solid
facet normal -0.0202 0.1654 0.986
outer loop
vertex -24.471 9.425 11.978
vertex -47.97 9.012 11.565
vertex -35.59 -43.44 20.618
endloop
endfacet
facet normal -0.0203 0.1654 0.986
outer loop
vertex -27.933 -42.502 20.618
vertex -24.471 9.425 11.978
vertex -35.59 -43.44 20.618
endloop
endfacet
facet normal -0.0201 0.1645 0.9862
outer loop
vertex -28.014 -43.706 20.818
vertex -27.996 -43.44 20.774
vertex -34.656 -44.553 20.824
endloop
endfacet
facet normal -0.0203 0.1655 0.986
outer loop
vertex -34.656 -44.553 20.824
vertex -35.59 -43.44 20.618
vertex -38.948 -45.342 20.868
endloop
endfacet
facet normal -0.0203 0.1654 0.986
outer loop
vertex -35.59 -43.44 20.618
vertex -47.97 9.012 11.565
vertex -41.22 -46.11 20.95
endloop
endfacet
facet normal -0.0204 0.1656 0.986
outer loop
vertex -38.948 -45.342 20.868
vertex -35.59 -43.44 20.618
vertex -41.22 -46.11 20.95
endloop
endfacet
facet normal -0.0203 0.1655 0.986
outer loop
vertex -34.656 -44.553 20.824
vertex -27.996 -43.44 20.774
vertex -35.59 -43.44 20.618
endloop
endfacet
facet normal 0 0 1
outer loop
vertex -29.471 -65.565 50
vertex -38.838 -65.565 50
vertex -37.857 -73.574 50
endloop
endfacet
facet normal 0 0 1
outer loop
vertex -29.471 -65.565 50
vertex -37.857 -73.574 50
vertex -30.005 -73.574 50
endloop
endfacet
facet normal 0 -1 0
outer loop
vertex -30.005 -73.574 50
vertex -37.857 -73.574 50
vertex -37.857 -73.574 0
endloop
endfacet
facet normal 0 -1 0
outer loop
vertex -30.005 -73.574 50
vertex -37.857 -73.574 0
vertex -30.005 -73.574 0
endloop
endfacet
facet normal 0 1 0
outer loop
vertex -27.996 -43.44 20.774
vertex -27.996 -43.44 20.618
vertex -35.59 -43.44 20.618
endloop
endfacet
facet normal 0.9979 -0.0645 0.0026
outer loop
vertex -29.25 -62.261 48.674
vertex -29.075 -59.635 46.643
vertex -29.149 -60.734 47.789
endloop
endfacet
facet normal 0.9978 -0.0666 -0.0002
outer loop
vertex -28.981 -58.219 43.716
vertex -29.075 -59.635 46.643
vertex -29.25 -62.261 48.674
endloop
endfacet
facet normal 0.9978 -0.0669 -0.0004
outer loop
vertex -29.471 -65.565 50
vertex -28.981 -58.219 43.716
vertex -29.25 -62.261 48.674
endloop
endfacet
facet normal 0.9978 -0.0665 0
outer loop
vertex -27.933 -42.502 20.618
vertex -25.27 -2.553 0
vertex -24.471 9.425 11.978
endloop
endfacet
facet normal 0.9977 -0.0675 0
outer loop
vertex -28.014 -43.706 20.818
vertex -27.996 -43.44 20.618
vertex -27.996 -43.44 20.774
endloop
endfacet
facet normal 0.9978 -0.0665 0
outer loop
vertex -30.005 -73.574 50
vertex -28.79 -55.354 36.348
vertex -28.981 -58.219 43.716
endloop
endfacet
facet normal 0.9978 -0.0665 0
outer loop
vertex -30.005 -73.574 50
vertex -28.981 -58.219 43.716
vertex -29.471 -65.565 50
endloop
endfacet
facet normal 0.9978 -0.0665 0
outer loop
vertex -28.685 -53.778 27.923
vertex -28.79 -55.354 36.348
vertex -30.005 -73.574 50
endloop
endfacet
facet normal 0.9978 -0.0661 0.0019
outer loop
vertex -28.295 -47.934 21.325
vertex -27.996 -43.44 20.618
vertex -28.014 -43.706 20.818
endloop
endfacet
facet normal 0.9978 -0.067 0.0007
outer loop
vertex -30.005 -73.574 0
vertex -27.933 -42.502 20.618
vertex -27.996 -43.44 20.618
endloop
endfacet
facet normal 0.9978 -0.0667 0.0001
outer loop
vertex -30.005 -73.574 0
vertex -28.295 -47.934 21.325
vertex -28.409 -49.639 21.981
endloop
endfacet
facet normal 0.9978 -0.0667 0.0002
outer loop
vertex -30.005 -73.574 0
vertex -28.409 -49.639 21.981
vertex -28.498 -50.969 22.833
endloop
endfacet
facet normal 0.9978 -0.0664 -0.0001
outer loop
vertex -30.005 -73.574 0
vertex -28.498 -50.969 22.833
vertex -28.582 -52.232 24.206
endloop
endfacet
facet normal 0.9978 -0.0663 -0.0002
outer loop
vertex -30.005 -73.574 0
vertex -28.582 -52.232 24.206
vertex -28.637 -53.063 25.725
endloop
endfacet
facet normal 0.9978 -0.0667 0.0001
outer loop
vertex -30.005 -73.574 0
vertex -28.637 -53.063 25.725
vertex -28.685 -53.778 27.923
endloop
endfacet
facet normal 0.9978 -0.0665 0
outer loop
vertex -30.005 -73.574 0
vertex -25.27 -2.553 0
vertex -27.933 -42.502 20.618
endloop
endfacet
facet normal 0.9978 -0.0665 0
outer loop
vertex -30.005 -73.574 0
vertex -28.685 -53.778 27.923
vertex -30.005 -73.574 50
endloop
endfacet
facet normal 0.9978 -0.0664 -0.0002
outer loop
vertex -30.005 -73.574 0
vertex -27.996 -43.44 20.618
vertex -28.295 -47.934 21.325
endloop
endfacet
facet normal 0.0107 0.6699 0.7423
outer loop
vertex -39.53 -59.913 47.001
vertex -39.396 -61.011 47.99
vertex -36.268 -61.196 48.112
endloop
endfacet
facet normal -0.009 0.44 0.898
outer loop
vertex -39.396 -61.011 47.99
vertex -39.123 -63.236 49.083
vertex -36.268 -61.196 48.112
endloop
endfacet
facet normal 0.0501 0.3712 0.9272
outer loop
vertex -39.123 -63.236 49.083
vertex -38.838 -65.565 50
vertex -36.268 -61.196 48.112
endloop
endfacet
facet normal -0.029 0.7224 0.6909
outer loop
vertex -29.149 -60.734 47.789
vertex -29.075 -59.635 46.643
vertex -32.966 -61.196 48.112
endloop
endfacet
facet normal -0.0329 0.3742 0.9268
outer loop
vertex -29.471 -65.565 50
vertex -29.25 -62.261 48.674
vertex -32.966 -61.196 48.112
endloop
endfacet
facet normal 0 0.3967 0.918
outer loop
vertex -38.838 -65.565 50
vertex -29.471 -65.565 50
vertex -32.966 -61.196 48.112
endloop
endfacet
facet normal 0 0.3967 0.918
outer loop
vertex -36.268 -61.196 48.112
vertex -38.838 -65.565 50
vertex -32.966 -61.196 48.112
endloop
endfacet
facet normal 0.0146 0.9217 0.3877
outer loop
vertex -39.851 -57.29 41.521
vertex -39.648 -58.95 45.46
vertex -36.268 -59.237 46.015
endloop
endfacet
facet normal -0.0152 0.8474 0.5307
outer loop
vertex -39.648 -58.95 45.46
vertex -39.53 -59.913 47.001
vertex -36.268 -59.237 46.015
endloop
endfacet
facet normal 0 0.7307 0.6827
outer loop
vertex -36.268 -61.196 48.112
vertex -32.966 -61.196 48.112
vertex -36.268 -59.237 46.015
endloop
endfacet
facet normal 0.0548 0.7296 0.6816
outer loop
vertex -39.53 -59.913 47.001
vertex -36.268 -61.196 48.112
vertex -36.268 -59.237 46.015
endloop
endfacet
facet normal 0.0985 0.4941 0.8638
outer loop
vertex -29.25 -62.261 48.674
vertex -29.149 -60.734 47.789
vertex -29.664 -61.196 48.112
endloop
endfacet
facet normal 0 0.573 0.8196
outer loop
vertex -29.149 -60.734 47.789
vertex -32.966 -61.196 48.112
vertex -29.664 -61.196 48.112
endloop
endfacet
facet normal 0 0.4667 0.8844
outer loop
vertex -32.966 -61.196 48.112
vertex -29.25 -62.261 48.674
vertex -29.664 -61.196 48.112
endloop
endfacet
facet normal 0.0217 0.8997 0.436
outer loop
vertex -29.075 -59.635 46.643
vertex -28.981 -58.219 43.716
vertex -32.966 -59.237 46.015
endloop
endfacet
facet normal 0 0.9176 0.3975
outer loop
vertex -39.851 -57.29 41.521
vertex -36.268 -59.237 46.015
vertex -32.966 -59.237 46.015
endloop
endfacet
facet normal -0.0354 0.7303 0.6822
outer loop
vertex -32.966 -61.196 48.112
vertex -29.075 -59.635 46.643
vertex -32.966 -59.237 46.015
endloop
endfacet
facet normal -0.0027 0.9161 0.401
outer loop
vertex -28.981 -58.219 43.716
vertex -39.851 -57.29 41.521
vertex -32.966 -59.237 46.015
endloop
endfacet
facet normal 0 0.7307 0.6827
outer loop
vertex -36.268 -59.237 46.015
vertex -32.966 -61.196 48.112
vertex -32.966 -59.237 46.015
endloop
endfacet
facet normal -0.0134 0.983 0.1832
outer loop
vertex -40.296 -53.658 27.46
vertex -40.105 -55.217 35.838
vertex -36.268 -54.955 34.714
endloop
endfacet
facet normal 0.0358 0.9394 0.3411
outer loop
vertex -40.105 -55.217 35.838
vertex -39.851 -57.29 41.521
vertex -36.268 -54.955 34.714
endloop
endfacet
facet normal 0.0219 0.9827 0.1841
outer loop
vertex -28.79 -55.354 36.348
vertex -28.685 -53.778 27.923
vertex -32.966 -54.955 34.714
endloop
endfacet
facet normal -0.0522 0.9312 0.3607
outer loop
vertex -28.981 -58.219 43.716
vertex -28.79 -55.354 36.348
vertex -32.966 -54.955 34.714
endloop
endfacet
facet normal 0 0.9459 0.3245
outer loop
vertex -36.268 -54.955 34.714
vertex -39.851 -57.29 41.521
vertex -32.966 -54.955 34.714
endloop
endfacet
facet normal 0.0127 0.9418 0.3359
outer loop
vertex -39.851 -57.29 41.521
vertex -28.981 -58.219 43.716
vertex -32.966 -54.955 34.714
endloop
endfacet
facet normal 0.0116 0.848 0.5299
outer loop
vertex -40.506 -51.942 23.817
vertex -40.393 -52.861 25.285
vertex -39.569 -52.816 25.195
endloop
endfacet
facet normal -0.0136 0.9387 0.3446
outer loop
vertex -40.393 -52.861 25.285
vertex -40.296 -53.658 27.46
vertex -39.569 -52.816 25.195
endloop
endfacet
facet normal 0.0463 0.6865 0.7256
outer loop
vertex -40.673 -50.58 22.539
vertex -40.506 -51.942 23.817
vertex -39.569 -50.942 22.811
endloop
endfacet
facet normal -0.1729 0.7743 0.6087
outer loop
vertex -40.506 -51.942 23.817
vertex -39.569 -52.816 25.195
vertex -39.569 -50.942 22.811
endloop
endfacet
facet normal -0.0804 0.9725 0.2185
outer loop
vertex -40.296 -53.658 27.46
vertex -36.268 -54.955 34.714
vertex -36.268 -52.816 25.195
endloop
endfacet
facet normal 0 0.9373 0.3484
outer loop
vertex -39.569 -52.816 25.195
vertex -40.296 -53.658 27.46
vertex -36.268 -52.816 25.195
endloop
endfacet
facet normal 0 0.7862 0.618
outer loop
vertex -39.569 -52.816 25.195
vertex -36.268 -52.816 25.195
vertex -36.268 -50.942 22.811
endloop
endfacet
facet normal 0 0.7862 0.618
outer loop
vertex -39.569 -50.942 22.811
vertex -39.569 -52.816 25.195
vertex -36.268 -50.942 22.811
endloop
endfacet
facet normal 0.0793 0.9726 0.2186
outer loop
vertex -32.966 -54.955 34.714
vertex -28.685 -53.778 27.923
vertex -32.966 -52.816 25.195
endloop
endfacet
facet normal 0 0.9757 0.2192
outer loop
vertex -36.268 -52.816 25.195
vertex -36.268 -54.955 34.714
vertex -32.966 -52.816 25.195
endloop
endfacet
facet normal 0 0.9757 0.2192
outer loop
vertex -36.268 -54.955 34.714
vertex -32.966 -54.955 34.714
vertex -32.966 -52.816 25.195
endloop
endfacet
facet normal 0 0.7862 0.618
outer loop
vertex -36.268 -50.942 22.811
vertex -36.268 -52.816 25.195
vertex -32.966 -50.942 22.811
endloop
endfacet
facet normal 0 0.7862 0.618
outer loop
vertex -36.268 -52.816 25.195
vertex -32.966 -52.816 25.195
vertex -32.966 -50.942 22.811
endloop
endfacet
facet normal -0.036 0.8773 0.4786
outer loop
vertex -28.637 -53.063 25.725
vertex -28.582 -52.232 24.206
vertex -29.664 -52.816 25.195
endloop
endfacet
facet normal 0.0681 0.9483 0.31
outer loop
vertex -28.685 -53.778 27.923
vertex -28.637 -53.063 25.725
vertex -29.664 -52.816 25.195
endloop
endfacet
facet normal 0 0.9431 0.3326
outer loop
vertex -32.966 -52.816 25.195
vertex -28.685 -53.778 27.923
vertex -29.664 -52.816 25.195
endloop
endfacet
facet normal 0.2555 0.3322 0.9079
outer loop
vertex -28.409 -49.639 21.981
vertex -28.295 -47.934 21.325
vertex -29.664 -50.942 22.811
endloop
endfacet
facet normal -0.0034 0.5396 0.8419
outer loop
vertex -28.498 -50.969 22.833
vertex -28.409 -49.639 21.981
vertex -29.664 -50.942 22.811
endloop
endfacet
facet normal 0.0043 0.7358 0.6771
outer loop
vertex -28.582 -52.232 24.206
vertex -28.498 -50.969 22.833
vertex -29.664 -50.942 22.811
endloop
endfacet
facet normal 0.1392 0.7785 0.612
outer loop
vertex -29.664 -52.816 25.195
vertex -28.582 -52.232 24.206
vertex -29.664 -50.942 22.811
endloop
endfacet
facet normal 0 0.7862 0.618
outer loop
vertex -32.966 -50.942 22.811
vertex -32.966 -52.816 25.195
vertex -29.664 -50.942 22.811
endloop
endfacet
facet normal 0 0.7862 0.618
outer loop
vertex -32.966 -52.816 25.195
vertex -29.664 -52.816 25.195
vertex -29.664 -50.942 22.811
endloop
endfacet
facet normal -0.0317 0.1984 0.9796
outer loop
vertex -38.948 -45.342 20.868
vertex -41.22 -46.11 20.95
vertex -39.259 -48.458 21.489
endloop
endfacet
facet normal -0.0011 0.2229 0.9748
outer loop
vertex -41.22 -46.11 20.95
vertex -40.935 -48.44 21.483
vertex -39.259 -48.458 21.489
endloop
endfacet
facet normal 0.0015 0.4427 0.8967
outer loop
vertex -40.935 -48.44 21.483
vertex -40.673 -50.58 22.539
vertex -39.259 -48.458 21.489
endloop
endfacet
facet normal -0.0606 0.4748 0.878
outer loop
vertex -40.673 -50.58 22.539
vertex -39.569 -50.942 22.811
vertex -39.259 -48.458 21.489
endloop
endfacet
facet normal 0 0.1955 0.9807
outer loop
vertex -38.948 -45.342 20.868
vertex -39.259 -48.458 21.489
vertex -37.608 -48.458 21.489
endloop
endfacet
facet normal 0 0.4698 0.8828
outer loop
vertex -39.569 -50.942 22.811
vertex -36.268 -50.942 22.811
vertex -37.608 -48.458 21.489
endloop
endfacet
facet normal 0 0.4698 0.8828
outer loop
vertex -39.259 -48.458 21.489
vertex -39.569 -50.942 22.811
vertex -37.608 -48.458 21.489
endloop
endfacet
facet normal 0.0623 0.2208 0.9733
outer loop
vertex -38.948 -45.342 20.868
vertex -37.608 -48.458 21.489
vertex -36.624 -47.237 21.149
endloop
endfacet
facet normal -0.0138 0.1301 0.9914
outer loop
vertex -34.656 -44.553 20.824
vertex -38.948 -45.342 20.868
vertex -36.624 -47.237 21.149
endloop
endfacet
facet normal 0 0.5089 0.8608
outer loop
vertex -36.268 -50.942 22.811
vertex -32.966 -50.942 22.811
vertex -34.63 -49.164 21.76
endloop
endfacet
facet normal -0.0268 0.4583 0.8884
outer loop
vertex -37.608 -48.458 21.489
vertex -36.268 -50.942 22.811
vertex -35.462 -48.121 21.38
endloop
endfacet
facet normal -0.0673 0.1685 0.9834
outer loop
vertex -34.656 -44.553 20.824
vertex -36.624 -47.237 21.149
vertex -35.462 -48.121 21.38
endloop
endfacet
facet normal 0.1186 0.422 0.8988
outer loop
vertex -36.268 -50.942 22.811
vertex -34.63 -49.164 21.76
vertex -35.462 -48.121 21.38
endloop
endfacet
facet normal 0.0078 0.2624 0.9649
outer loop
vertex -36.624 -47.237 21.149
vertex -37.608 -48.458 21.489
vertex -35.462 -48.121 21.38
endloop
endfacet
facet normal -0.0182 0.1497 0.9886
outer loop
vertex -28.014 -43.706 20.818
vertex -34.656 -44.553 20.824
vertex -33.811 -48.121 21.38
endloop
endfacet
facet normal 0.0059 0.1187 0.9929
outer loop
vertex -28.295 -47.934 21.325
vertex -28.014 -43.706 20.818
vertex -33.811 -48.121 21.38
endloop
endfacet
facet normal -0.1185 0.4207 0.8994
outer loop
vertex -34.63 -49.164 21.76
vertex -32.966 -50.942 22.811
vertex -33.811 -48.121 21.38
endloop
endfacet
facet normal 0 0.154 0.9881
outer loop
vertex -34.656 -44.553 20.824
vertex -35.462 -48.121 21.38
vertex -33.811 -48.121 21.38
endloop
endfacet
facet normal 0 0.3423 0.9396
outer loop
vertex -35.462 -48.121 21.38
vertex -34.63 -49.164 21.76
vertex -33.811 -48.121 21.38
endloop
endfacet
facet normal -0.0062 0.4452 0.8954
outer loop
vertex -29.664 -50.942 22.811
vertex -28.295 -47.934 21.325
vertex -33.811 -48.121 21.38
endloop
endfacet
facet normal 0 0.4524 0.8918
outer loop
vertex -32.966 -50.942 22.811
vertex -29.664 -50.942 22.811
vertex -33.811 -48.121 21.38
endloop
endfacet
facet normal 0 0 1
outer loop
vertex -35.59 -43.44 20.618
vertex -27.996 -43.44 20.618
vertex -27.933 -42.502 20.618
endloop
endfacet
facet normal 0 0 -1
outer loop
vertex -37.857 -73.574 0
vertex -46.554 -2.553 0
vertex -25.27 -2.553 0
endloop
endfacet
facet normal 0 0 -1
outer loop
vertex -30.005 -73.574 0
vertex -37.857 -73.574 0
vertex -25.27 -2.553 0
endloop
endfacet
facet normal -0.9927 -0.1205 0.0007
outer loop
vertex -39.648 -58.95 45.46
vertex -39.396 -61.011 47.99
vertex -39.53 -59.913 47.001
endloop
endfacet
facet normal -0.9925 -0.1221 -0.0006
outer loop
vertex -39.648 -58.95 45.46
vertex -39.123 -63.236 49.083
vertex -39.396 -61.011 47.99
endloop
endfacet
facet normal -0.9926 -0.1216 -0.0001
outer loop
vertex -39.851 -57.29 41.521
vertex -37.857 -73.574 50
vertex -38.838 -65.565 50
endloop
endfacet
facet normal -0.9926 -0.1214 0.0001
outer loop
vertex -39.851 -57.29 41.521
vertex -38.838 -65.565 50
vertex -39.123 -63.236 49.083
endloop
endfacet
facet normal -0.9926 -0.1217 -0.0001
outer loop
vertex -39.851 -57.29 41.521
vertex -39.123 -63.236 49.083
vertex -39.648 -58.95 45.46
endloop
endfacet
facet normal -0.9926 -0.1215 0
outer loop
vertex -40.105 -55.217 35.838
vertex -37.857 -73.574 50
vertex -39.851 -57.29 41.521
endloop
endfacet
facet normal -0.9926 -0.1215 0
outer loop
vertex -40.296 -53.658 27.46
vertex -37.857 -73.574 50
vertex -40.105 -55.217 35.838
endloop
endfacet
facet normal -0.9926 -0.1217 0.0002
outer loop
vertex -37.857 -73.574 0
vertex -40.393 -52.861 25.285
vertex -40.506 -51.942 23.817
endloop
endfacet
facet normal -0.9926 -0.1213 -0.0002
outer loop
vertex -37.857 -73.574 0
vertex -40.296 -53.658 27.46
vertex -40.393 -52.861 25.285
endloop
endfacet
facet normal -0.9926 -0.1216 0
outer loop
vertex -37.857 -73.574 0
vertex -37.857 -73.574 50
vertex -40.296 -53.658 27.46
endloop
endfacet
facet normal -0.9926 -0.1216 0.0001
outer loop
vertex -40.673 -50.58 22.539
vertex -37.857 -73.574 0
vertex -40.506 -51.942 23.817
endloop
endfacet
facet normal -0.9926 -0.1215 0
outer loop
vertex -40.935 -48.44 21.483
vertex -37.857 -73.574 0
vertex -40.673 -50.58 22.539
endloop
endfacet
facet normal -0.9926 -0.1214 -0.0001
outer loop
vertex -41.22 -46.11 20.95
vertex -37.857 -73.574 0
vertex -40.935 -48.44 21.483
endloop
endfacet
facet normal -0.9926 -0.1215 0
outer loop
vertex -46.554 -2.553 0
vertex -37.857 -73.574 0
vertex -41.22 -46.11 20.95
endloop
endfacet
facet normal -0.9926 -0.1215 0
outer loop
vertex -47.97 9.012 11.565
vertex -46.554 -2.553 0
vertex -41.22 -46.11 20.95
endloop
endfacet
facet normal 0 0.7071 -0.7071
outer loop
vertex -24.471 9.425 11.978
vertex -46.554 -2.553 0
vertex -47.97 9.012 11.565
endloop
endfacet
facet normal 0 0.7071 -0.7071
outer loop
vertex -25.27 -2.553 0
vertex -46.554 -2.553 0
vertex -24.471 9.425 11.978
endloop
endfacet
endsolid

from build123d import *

# Parameters (mm, degrees)
F0_W      = 25.1408442855
F0_H      = 121.0211291909
F1_DEPTH  = 50
F2_SIZE   = 49.99999
F3_W      = 91.4516113698
F3_H      = 29.3820567429
F4_DEPTH  = 26
F7_DEPTH  = 26
F9_DEPTH  = 50
F11_DEPTH = 55
F13_DEPTH = 25


# Not quite as in the source:
# - a fillet or chamfer is up to 0.001 mm smaller than in the source, because OpenCascade refuses the exact size


with BuildPart() as f1:
    # F0 (on Top) → F1 (new body)
    with BuildSketch(Plane.XY):
        with Locations((-35.985916853, -13.0633823574)):
            Rectangle(F0_W, F0_H)
    extrude(amount=F1_DEPTH)

    # F2 (size 50 in the source; OpenCascade refuses exactly that, so slightly less here)
    f2_edges = [f1.edges().sort_by_distance(p)[0] for p in [
        (-35.985917, 47.447182, 0),
    ]]
    chamfer(f2_edges, length=F2_SIZE)

    # F3 (on face) → F4 (cut)
    with BuildSketch(Plane.YZ.offset(-23.4154947102)):
        with Locations((2.2862907499, 35.3089716285)):
            Rectangle(F3_W, F3_H)
    extrude(amount=-F4_DEPTH, mode=Mode.SUBTRACT)

    # F6 (on face) → F7 (cut)
    with BuildSketch(Plane.YZ.offset(-23.4154947102)):
        with BuildLine():
            add(Edge.make_bspline(
                [(-66.471672154, 50.7267448454), (-66.3301689203, 49.9168473843), (-59.8711260209, 48.6776696356), (-58.2068726445, 43.1050844178), (-54.0340520057, 35.0412473829), (-54.2777638398, 19.262544423), (-29.8031687904, 20.774326267), (-23.5577770812, 45.5234958201), (-47.8291550907, 56.2410515184), (-66.7088060402, 52.0839868491), (-66.471672154, 50.7267448454)],
                knots=[0, 0, 0, 0, 0.0838937014, 0.1662578753, 0.2711363939, 0.393677104, 0.5393220763, 0.6884110648, 0.8594092945, 1, 1, 1, 1], degree=3))
        make_face()
    extrude(amount=-F7_DEPTH, mode=Mode.SUBTRACT)

    # F8 (on Top) → F9 (cut)
    with BuildSketch(Plane.XY):
        Polygon((-37.4647900462, -76.7781734467), (-49.2957793176, 19.8415517807), (-59.1298444312, -76.7781734467), align=None)
    extrude(amount=F9_DEPTH, mode=Mode.SUBTRACT)

    # F10 (on Top) → F11 (cut)
    with BuildSketch(Plane.XY):
        Polygon((-11.8309855461, -74.559867382), (-23.4154947102, 25.2640862018), (-30.0704240799, -74.559867382), align=None)
    extrude(amount=F11_DEPTH, mode=Mode.SUBTRACT)

    # F12 (on face) → F13 (cut)
    with BuildSketch(Plane(origin=(-46.1738809914, -5.6539458102, 0), x_dir=(0.1215412158, -0.9925863856, 0), z_dir=(-0.9925863856, -0.1215412158, 0))):
        Polygon((-24.7206917847, 26.6503777788), (-24.7206917847, 9.8842468545), (40.7590243896, 20.9504020134), align=None)
    extrude(amount=-F13_DEPTH, mode=Mode.SUBTRACT)


solid = f1.part
